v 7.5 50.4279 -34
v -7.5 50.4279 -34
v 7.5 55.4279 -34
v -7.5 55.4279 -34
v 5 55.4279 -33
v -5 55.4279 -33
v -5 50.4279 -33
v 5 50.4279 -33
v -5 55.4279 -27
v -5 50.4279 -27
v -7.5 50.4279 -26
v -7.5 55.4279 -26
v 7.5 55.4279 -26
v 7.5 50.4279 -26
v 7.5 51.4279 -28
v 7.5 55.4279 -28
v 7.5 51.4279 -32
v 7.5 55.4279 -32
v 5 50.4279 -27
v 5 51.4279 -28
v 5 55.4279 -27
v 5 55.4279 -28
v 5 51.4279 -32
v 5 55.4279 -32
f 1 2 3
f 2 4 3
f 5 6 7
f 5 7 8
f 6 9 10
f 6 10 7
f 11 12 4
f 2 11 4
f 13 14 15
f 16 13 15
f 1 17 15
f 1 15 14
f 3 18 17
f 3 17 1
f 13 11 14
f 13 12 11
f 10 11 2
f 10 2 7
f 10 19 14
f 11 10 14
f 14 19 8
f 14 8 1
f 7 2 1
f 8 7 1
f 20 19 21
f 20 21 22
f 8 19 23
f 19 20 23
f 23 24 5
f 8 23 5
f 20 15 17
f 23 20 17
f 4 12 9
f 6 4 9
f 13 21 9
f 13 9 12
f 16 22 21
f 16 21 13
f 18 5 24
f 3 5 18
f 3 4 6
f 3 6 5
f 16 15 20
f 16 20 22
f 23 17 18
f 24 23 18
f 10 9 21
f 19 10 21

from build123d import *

# Parameters (mm, degrees)
CUT_EXTRUDE3_DEPTH           = 60
CUT_EXTRUDE5_DEPTH           = 2
CUT_EXTRUDE5_DEPTH_BACK      = 30
SKETCH9_R                    = 38
SKETCH9_R_2                  = 23
SKETCH19_W                   = 12
SKETCH19_H                   = 36.5
CUT_REVOLVE2_ANGLE           = 65
CUT_REVOLVE2_OTHER_WAY_ANGLE = 65
SKETCH21_W                   = 3.25
SKETCH21_H                   = 4
BOSS_EXTRUDE3_DEPTH          = 1.35
CIRPATTERN1_COUNT            = 5
CUT_EXTRUDE9_START           = -5
CUT_EXTRUDE9_DEPTH           = 5
SKETCH23_R                   = 10.5
CUT_EXTRUDE10_DEPTH          = 10
SKETCH24_W                   = 15
SKETCH24_H                   = 8
BOSS_EXTRUDE4_DEPTH          = 8
SKETCH26_W                   = 10
SKETCH26_H                   = 6
CUT_EXTRUDE11_DEPTH          = 10
SKETCH27_W                   = 4
SKETCH27_H                   = 5
CUT_EXTRUDE12_DEPTH          = 5
CUT_EXTRUDE14_DEPTH          = 2
CUT_EXTRUDE14_DEPTH_BACK     = 30
SKETCH29_R                   = 1
CUT_EXTRUDE15_DEPTH          = 15
FILLET1_R                    = 6
FILLET2_R                    = 8
INTERSECT1_OUTLINE_W         = 15
INTERSECT1_OUTLINE_H         = 8
INTERSECT1_OUTLINE_W_2       = 10
INTERSECT1_OUTLINE_H_2       = 6
INTERSECT1_DEPTH             = 63.427876097
INTERSECT1_START             = 13
INTERSECT1_2_OUTLINE_W       = 15
INTERSECT1_2_OUTLINE_H       = 8
INTERSECT1_2_OUTLINE_W_2     = 10
INTERSECT1_2_OUTLINE_H_2     = 6
INTERSECT1_2_DEPTH           = 12.427876097
INTERSECT1_START_2           = 55.427876097
INTERSECT1_3_OUTLINE_W       = 15
INTERSECT1_3_OUTLINE_H       = 8
INTERSECT1_3_OUTLINE_W_2     = 10
INTERSECT1_3_OUTLINE_H_2     = 6
INTERSECT1_3_DEPTH           = 3


# Read off the part's stored shape, not the designer's step: Cut-Extrude9, Intersect1
with BuildPart() as part:
    # Sketch1 → Revolve1 (revolve)
    with BuildSketch(Plane.XY, mode=Mode.PRIVATE) as revolve1_sk:
        with BuildLine():
            Line((0, 63.427876097), (32, 63.427876097))
            ThreePointArc((32, 63.427876097), (37.656854249, 61.084730346), (40, 55.427876097))
            Line((40, 55.427876097), (40, 28.846818009))
            ThreePointArc((40, 28.846818009), (38.792081772, 24.082439968), (35.460140376, 20.469057744))
            Line((35.460140376, 20.469057744), (28.539859624, 15.958818353))
            ThreePointArc((28.539859624, 15.958818353), (25.207918228, 12.345436129), (24, 7.581058088))
            Line((24, 7.581058088), (24, 3.25))
            Line((24, 3.25), (24.35, 3))
            Line((24.35, 3), (24.35, 0))
            Line((24.35, 0), (22.5, 0))
            Line((22.5, 0), (22.5, 12.5))
            ThreePointArc((22.5, 12.5), (22.353553391, 12.853553391), (22, 13))
            Line((22, 13), (0, 13))
            Line((0, 13), (0, 63.427876097))
        make_face()
    revolve(revolve1_sk.sketch.rotate(Axis((0, 0, 0), (0, 1, 0)), 90), axis=Axis((0, 0, 0), (0, 1, 0)))

    # Sketch11 → Cut-Extrude3 (cut)
    with BuildSketch(Plane(origin=(0, 13, 0), x_dir=(-1, 0, 0), z_dir=(0, -1, 0))):
        with BuildLine():
            Line((-21, 0), (21, 0))
            ThreePointArc((21, 0), (0, 21), (-21, 0))
        make_face()
    extrude(amount=-CUT_EXTRUDE3_DEPTH, mode=Mode.SUBTRACT)

    # Sketch9 → Cut-Extrude5 (cut, two sides: drawn at the far end of the back side and taken through both)
    with BuildSketch(Plane(origin=(0, 55.427876097, 0), x_dir=(1, 0, 0), z_dir=(0, 1, 0)).offset(-CUT_EXTRUDE5_DEPTH_BACK)):
        with Locations(Location((0, 0, 0), (0, 0, 270))):
            Circle(SKETCH9_R)
        with Locations(Location((0, 0, 0), (0, 0, 270))):
            Circle(SKETCH9_R_2, mode=Mode.SUBTRACT)
    extrude(amount=CUT_EXTRUDE5_DEPTH + CUT_EXTRUDE5_DEPTH_BACK, mode=Mode.SUBTRACT)

    # Sketch19 → Cut-Revolve2 (revolve, cut)
    with BuildSketch(Plane(origin=(0, 0, 0), x_dir=(0, 0, -1), z_dir=(1, 0, 0))):
        with Locations((-41.064715832, 37.177876097)):
            Rectangle(SKETCH19_W, SKETCH19_H)
    revolve(axis=Axis((0, 0, 0), (0, 1, 0)), revolution_arc=CUT_REVOLVE2_ANGLE, mode=Mode.SUBTRACT)

    # Sketch19 → Cut-Revolve2 other way (revolve, cut)
    with BuildSketch(Plane(origin=(0, 0, 0), x_dir=(0, 0, -1), z_dir=(1, 0, 0))):
        with Locations((-41.064715832, 37.177876097)):
            Rectangle(SKETCH19_W, SKETCH19_H)
    revolve(axis=Axis((0, 0, 0), (0, -1, 0)), revolution_arc=CUT_REVOLVE2_OTHER_WAY_ANGLE, mode=Mode.SUBTRACT)

    # Sketch21 → Boss-Extrude3 (add)
    with BuildSketch(Plane(origin=(0, 0, 22.5), x_dir=(-1, 0, 0), z_dir=(0, 0, -1))):
        with Locations((0, 2)):
            Rectangle(SKETCH21_W, SKETCH21_H)
    boss_extrude3 = extrude(amount=BOSS_EXTRUDE3_DEPTH)

    # CirPattern1: Boss-Extrude3 ×5 about axis
    cirpattern1_axis = Axis((0, 0, 0), (0, 1, 0))
    for i in range(1, CIRPATTERN1_COUNT):
        add(boss_extrude3.rotate(cirpattern1_axis, i * 360 / CIRPATTERN1_COUNT))

    # Cut-Extrude9 outline → Cut-Extrude9 (cut)
    with BuildSketch(Plane(origin=(0, 63.427876097, 0), x_dir=(1, 0, 0), z_dir=(0, 1, 0)).offset(CUT_EXTRUDE9_START)):
        with BuildLine():
            ThreePointArc((40, 0), (0, 40), (-40, 0))
            Line((-40, 0), (-21, 0))
            ThreePointArc((-21, 0), (0, 21), (21, 0))
            Line((21, 0), (40, 0))
        make_face()
    extrude(amount=CUT_EXTRUDE9_DEPTH, mode=Mode.SUBTRACT)

    # Sketch23 → Cut-Extrude10 (cut)
    with BuildSketch(Plane(origin=(0, 0, -40), x_dir=(-1, 0, 0), z_dir=(0, 0, -1))):
        with Locations((0, 42.137876097)):
            Circle(SKETCH23_R)
    extrude(amount=-CUT_EXTRUDE10_DEPTH, mode=Mode.SUBTRACT)

    # Sketch24 → Boss-Extrude4 (add)
    with BuildSketch(Plane(origin=(0, 58.427876097, 0), x_dir=(1, 0, 0), z_dir=(0, 1, 0))):
        with Locations((0, 30)):
            Rectangle(SKETCH24_W, SKETCH24_H)
    extrude(amount=-BOSS_EXTRUDE4_DEPTH)

    # Sketch26 → Cut-Extrude11 (cut)
    with BuildSketch(Plane(origin=(0, 58.427876097, 0), x_dir=(1, 0, 0), z_dir=(0, 1, 0))):
        with Locations((0, 30)):
            Rectangle(SKETCH26_W, SKETCH26_H)
    extrude(amount=-CUT_EXTRUDE11_DEPTH, mode=Mode.SUBTRACT)

    # Sketch27 → Cut-Extrude12 (cut)
    with BuildSketch(Plane(origin=(7.5, 0, 0), x_dir=(0, 0, -1), z_dir=(1, 0, 0))):
        with Locations((30, 53.927876097)):
            Rectangle(SKETCH27_W, SKETCH27_H)
    extrude(amount=-CUT_EXTRUDE12_DEPTH, mode=Mode.SUBTRACT)

    # Sketch28 → Cut-Extrude14 (cut, two sides: drawn at the far end of the back side and taken through both)
    with BuildSketch(Plane(origin=(0, 55.427876097, 0), x_dir=(1, 0, 0), z_dir=(0, 1, 0)).offset(-CUT_EXTRUDE14_DEPTH_BACK)):
        with BuildLine():
            Line((-22.912878475, -2), (22.912878475, -2))
            ThreePointArc((22.912878475, -2), (0, -23), (-22.912878475, -2))
        make_face()
    extrude(amount=CUT_EXTRUDE14_DEPTH + CUT_EXTRUDE14_DEPTH_BACK, mode=Mode.SUBTRACT)

    # Sketch29 → Cut-Extrude15 (cut)
    with BuildSketch(Plane(origin=(0, 0, 0), x_dir=(-1, 0, 0), z_dir=(0, 0, -1))):
        with Locations((-30.416198487, 60.927876097)):
            Circle(SKETCH29_R)
        with Locations((30.416198487, 60.927876097)):
            Circle(SKETCH29_R)
        with Locations((0, 60.927876097)):
            Circle(SKETCH29_R)
    extrude(amount=-CUT_EXTRUDE15_DEPTH, mode=Mode.SUBTRACT)

    # Fillet1
    fillet1_edges = [part.edges().sort_by_distance(p)[0] for p in [
        (21, 35.713938048, 0),
        (-21, 35.713938048, 0),
    ]]
    fillet(fillet1_edges, radius=FILLET1_R)

    # Fillet2
    fillet2_edges = [part.edges().sort_by_distance(p)[0] for p in [
        (-22.912878475, 41.427876097, 2),
        (22.912878475, 41.427876097, 2),
    ]]
    fillet(fillet2_edges, radius=FILLET2_R)

    # Intersect1 outline → Intersect1 (cut)
    # profile 1 of 2: a face of its own
    with BuildSketch(Plane(origin=(0, 0, 0), x_dir=(1, 0, 0), z_dir=(0, 1, 0))):
        with BuildLine():
            Line((-37.080992435, -15), (-40.906642577, -15))
            Line((-40.906642577, -15), (-42, -15.355253362))
            Line((-42, -15.355253362), (-42, -42))
            Line((-42, -42), (42, -42))
            Line((42, -42), (42, -15.355253362))
            Line((42, -15.355253362), (40.906642577, -15))
            Line((40.906642577, -15), (37.080992435, -15))
            ThreePointArc((37.080992435, -15), (0, 40), (-37.080992435, -15))
        make_face()
        with BuildLine():
            ThreePointArc((19.246817919, 8.4), (18.767687244, 2.713664655), (13.747727085, 0))
            Line((13.747727085, 0), (-13.747727085, 0))
            ThreePointArc((-13.747727085, 0), (-18.767687244, 2.713664655), (-19.246817919, 8.4))
            ThreePointArc((-19.246817919, 8.4), (0, 21), (19.246817919, 8.4))
        make_face(mode=Mode.SUBTRACT)
        with Locations((0, 30)):
            Rectangle(INTERSECT1_OUTLINE_W, INTERSECT1_OUTLINE_H, mode=Mode.SUBTRACT)
    # profile 2 of 2: a face of its own
    with BuildSketch(Plane(origin=(0, 0, 0), x_dir=(1, 0, 0), z_dir=(0, 1, 0))):
        with Locations((0, 30)):
            Rectangle(INTERSECT1_OUTLINE_W_2, INTERSECT1_OUTLINE_H_2)
    extrude(amount=INTERSECT1_DEPTH, mode=Mode.SUBTRACT)

    # Intersect1 2 outline → Intersect1 2 (cut)
    with BuildSketch(Plane(origin=(0, 0, 0), x_dir=(1, 0, 0), z_dir=(0, 1, 0)).offset(INTERSECT1_START)):
        with Locations((0, 30)):
            Rectangle(INTERSECT1_2_OUTLINE_W, INTERSECT1_2_OUTLINE_H)
        with Locations((0, 30)):
            Rectangle(INTERSECT1_2_OUTLINE_W_2, INTERSECT1_2_OUTLINE_H_2, mode=Mode.SUBTRACT)
    extrude(amount=INTERSECT1_2_DEPTH, mode=Mode.SUBTRACT)

    # Intersect1 3 outline → Intersect1 3 (cut)
    with BuildSketch(Plane(origin=(0, 0, 0), x_dir=(1, 0, 0), z_dir=(0, 1, 0)).offset(INTERSECT1_START_2)):
        with Locations((0, 30)):
            Rectangle(INTERSECT1_3_OUTLINE_W, INTERSECT1_3_OUTLINE_H)
        with Locations((0, 30)):
            Rectangle(INTERSECT1_3_OUTLINE_W_2, INTERSECT1_3_OUTLINE_H_2, mode=Mode.SUBTRACT)
    extrude(amount=INTERSECT1_3_DEPTH, mode=Mode.SUBTRACT)


solid = part.part
